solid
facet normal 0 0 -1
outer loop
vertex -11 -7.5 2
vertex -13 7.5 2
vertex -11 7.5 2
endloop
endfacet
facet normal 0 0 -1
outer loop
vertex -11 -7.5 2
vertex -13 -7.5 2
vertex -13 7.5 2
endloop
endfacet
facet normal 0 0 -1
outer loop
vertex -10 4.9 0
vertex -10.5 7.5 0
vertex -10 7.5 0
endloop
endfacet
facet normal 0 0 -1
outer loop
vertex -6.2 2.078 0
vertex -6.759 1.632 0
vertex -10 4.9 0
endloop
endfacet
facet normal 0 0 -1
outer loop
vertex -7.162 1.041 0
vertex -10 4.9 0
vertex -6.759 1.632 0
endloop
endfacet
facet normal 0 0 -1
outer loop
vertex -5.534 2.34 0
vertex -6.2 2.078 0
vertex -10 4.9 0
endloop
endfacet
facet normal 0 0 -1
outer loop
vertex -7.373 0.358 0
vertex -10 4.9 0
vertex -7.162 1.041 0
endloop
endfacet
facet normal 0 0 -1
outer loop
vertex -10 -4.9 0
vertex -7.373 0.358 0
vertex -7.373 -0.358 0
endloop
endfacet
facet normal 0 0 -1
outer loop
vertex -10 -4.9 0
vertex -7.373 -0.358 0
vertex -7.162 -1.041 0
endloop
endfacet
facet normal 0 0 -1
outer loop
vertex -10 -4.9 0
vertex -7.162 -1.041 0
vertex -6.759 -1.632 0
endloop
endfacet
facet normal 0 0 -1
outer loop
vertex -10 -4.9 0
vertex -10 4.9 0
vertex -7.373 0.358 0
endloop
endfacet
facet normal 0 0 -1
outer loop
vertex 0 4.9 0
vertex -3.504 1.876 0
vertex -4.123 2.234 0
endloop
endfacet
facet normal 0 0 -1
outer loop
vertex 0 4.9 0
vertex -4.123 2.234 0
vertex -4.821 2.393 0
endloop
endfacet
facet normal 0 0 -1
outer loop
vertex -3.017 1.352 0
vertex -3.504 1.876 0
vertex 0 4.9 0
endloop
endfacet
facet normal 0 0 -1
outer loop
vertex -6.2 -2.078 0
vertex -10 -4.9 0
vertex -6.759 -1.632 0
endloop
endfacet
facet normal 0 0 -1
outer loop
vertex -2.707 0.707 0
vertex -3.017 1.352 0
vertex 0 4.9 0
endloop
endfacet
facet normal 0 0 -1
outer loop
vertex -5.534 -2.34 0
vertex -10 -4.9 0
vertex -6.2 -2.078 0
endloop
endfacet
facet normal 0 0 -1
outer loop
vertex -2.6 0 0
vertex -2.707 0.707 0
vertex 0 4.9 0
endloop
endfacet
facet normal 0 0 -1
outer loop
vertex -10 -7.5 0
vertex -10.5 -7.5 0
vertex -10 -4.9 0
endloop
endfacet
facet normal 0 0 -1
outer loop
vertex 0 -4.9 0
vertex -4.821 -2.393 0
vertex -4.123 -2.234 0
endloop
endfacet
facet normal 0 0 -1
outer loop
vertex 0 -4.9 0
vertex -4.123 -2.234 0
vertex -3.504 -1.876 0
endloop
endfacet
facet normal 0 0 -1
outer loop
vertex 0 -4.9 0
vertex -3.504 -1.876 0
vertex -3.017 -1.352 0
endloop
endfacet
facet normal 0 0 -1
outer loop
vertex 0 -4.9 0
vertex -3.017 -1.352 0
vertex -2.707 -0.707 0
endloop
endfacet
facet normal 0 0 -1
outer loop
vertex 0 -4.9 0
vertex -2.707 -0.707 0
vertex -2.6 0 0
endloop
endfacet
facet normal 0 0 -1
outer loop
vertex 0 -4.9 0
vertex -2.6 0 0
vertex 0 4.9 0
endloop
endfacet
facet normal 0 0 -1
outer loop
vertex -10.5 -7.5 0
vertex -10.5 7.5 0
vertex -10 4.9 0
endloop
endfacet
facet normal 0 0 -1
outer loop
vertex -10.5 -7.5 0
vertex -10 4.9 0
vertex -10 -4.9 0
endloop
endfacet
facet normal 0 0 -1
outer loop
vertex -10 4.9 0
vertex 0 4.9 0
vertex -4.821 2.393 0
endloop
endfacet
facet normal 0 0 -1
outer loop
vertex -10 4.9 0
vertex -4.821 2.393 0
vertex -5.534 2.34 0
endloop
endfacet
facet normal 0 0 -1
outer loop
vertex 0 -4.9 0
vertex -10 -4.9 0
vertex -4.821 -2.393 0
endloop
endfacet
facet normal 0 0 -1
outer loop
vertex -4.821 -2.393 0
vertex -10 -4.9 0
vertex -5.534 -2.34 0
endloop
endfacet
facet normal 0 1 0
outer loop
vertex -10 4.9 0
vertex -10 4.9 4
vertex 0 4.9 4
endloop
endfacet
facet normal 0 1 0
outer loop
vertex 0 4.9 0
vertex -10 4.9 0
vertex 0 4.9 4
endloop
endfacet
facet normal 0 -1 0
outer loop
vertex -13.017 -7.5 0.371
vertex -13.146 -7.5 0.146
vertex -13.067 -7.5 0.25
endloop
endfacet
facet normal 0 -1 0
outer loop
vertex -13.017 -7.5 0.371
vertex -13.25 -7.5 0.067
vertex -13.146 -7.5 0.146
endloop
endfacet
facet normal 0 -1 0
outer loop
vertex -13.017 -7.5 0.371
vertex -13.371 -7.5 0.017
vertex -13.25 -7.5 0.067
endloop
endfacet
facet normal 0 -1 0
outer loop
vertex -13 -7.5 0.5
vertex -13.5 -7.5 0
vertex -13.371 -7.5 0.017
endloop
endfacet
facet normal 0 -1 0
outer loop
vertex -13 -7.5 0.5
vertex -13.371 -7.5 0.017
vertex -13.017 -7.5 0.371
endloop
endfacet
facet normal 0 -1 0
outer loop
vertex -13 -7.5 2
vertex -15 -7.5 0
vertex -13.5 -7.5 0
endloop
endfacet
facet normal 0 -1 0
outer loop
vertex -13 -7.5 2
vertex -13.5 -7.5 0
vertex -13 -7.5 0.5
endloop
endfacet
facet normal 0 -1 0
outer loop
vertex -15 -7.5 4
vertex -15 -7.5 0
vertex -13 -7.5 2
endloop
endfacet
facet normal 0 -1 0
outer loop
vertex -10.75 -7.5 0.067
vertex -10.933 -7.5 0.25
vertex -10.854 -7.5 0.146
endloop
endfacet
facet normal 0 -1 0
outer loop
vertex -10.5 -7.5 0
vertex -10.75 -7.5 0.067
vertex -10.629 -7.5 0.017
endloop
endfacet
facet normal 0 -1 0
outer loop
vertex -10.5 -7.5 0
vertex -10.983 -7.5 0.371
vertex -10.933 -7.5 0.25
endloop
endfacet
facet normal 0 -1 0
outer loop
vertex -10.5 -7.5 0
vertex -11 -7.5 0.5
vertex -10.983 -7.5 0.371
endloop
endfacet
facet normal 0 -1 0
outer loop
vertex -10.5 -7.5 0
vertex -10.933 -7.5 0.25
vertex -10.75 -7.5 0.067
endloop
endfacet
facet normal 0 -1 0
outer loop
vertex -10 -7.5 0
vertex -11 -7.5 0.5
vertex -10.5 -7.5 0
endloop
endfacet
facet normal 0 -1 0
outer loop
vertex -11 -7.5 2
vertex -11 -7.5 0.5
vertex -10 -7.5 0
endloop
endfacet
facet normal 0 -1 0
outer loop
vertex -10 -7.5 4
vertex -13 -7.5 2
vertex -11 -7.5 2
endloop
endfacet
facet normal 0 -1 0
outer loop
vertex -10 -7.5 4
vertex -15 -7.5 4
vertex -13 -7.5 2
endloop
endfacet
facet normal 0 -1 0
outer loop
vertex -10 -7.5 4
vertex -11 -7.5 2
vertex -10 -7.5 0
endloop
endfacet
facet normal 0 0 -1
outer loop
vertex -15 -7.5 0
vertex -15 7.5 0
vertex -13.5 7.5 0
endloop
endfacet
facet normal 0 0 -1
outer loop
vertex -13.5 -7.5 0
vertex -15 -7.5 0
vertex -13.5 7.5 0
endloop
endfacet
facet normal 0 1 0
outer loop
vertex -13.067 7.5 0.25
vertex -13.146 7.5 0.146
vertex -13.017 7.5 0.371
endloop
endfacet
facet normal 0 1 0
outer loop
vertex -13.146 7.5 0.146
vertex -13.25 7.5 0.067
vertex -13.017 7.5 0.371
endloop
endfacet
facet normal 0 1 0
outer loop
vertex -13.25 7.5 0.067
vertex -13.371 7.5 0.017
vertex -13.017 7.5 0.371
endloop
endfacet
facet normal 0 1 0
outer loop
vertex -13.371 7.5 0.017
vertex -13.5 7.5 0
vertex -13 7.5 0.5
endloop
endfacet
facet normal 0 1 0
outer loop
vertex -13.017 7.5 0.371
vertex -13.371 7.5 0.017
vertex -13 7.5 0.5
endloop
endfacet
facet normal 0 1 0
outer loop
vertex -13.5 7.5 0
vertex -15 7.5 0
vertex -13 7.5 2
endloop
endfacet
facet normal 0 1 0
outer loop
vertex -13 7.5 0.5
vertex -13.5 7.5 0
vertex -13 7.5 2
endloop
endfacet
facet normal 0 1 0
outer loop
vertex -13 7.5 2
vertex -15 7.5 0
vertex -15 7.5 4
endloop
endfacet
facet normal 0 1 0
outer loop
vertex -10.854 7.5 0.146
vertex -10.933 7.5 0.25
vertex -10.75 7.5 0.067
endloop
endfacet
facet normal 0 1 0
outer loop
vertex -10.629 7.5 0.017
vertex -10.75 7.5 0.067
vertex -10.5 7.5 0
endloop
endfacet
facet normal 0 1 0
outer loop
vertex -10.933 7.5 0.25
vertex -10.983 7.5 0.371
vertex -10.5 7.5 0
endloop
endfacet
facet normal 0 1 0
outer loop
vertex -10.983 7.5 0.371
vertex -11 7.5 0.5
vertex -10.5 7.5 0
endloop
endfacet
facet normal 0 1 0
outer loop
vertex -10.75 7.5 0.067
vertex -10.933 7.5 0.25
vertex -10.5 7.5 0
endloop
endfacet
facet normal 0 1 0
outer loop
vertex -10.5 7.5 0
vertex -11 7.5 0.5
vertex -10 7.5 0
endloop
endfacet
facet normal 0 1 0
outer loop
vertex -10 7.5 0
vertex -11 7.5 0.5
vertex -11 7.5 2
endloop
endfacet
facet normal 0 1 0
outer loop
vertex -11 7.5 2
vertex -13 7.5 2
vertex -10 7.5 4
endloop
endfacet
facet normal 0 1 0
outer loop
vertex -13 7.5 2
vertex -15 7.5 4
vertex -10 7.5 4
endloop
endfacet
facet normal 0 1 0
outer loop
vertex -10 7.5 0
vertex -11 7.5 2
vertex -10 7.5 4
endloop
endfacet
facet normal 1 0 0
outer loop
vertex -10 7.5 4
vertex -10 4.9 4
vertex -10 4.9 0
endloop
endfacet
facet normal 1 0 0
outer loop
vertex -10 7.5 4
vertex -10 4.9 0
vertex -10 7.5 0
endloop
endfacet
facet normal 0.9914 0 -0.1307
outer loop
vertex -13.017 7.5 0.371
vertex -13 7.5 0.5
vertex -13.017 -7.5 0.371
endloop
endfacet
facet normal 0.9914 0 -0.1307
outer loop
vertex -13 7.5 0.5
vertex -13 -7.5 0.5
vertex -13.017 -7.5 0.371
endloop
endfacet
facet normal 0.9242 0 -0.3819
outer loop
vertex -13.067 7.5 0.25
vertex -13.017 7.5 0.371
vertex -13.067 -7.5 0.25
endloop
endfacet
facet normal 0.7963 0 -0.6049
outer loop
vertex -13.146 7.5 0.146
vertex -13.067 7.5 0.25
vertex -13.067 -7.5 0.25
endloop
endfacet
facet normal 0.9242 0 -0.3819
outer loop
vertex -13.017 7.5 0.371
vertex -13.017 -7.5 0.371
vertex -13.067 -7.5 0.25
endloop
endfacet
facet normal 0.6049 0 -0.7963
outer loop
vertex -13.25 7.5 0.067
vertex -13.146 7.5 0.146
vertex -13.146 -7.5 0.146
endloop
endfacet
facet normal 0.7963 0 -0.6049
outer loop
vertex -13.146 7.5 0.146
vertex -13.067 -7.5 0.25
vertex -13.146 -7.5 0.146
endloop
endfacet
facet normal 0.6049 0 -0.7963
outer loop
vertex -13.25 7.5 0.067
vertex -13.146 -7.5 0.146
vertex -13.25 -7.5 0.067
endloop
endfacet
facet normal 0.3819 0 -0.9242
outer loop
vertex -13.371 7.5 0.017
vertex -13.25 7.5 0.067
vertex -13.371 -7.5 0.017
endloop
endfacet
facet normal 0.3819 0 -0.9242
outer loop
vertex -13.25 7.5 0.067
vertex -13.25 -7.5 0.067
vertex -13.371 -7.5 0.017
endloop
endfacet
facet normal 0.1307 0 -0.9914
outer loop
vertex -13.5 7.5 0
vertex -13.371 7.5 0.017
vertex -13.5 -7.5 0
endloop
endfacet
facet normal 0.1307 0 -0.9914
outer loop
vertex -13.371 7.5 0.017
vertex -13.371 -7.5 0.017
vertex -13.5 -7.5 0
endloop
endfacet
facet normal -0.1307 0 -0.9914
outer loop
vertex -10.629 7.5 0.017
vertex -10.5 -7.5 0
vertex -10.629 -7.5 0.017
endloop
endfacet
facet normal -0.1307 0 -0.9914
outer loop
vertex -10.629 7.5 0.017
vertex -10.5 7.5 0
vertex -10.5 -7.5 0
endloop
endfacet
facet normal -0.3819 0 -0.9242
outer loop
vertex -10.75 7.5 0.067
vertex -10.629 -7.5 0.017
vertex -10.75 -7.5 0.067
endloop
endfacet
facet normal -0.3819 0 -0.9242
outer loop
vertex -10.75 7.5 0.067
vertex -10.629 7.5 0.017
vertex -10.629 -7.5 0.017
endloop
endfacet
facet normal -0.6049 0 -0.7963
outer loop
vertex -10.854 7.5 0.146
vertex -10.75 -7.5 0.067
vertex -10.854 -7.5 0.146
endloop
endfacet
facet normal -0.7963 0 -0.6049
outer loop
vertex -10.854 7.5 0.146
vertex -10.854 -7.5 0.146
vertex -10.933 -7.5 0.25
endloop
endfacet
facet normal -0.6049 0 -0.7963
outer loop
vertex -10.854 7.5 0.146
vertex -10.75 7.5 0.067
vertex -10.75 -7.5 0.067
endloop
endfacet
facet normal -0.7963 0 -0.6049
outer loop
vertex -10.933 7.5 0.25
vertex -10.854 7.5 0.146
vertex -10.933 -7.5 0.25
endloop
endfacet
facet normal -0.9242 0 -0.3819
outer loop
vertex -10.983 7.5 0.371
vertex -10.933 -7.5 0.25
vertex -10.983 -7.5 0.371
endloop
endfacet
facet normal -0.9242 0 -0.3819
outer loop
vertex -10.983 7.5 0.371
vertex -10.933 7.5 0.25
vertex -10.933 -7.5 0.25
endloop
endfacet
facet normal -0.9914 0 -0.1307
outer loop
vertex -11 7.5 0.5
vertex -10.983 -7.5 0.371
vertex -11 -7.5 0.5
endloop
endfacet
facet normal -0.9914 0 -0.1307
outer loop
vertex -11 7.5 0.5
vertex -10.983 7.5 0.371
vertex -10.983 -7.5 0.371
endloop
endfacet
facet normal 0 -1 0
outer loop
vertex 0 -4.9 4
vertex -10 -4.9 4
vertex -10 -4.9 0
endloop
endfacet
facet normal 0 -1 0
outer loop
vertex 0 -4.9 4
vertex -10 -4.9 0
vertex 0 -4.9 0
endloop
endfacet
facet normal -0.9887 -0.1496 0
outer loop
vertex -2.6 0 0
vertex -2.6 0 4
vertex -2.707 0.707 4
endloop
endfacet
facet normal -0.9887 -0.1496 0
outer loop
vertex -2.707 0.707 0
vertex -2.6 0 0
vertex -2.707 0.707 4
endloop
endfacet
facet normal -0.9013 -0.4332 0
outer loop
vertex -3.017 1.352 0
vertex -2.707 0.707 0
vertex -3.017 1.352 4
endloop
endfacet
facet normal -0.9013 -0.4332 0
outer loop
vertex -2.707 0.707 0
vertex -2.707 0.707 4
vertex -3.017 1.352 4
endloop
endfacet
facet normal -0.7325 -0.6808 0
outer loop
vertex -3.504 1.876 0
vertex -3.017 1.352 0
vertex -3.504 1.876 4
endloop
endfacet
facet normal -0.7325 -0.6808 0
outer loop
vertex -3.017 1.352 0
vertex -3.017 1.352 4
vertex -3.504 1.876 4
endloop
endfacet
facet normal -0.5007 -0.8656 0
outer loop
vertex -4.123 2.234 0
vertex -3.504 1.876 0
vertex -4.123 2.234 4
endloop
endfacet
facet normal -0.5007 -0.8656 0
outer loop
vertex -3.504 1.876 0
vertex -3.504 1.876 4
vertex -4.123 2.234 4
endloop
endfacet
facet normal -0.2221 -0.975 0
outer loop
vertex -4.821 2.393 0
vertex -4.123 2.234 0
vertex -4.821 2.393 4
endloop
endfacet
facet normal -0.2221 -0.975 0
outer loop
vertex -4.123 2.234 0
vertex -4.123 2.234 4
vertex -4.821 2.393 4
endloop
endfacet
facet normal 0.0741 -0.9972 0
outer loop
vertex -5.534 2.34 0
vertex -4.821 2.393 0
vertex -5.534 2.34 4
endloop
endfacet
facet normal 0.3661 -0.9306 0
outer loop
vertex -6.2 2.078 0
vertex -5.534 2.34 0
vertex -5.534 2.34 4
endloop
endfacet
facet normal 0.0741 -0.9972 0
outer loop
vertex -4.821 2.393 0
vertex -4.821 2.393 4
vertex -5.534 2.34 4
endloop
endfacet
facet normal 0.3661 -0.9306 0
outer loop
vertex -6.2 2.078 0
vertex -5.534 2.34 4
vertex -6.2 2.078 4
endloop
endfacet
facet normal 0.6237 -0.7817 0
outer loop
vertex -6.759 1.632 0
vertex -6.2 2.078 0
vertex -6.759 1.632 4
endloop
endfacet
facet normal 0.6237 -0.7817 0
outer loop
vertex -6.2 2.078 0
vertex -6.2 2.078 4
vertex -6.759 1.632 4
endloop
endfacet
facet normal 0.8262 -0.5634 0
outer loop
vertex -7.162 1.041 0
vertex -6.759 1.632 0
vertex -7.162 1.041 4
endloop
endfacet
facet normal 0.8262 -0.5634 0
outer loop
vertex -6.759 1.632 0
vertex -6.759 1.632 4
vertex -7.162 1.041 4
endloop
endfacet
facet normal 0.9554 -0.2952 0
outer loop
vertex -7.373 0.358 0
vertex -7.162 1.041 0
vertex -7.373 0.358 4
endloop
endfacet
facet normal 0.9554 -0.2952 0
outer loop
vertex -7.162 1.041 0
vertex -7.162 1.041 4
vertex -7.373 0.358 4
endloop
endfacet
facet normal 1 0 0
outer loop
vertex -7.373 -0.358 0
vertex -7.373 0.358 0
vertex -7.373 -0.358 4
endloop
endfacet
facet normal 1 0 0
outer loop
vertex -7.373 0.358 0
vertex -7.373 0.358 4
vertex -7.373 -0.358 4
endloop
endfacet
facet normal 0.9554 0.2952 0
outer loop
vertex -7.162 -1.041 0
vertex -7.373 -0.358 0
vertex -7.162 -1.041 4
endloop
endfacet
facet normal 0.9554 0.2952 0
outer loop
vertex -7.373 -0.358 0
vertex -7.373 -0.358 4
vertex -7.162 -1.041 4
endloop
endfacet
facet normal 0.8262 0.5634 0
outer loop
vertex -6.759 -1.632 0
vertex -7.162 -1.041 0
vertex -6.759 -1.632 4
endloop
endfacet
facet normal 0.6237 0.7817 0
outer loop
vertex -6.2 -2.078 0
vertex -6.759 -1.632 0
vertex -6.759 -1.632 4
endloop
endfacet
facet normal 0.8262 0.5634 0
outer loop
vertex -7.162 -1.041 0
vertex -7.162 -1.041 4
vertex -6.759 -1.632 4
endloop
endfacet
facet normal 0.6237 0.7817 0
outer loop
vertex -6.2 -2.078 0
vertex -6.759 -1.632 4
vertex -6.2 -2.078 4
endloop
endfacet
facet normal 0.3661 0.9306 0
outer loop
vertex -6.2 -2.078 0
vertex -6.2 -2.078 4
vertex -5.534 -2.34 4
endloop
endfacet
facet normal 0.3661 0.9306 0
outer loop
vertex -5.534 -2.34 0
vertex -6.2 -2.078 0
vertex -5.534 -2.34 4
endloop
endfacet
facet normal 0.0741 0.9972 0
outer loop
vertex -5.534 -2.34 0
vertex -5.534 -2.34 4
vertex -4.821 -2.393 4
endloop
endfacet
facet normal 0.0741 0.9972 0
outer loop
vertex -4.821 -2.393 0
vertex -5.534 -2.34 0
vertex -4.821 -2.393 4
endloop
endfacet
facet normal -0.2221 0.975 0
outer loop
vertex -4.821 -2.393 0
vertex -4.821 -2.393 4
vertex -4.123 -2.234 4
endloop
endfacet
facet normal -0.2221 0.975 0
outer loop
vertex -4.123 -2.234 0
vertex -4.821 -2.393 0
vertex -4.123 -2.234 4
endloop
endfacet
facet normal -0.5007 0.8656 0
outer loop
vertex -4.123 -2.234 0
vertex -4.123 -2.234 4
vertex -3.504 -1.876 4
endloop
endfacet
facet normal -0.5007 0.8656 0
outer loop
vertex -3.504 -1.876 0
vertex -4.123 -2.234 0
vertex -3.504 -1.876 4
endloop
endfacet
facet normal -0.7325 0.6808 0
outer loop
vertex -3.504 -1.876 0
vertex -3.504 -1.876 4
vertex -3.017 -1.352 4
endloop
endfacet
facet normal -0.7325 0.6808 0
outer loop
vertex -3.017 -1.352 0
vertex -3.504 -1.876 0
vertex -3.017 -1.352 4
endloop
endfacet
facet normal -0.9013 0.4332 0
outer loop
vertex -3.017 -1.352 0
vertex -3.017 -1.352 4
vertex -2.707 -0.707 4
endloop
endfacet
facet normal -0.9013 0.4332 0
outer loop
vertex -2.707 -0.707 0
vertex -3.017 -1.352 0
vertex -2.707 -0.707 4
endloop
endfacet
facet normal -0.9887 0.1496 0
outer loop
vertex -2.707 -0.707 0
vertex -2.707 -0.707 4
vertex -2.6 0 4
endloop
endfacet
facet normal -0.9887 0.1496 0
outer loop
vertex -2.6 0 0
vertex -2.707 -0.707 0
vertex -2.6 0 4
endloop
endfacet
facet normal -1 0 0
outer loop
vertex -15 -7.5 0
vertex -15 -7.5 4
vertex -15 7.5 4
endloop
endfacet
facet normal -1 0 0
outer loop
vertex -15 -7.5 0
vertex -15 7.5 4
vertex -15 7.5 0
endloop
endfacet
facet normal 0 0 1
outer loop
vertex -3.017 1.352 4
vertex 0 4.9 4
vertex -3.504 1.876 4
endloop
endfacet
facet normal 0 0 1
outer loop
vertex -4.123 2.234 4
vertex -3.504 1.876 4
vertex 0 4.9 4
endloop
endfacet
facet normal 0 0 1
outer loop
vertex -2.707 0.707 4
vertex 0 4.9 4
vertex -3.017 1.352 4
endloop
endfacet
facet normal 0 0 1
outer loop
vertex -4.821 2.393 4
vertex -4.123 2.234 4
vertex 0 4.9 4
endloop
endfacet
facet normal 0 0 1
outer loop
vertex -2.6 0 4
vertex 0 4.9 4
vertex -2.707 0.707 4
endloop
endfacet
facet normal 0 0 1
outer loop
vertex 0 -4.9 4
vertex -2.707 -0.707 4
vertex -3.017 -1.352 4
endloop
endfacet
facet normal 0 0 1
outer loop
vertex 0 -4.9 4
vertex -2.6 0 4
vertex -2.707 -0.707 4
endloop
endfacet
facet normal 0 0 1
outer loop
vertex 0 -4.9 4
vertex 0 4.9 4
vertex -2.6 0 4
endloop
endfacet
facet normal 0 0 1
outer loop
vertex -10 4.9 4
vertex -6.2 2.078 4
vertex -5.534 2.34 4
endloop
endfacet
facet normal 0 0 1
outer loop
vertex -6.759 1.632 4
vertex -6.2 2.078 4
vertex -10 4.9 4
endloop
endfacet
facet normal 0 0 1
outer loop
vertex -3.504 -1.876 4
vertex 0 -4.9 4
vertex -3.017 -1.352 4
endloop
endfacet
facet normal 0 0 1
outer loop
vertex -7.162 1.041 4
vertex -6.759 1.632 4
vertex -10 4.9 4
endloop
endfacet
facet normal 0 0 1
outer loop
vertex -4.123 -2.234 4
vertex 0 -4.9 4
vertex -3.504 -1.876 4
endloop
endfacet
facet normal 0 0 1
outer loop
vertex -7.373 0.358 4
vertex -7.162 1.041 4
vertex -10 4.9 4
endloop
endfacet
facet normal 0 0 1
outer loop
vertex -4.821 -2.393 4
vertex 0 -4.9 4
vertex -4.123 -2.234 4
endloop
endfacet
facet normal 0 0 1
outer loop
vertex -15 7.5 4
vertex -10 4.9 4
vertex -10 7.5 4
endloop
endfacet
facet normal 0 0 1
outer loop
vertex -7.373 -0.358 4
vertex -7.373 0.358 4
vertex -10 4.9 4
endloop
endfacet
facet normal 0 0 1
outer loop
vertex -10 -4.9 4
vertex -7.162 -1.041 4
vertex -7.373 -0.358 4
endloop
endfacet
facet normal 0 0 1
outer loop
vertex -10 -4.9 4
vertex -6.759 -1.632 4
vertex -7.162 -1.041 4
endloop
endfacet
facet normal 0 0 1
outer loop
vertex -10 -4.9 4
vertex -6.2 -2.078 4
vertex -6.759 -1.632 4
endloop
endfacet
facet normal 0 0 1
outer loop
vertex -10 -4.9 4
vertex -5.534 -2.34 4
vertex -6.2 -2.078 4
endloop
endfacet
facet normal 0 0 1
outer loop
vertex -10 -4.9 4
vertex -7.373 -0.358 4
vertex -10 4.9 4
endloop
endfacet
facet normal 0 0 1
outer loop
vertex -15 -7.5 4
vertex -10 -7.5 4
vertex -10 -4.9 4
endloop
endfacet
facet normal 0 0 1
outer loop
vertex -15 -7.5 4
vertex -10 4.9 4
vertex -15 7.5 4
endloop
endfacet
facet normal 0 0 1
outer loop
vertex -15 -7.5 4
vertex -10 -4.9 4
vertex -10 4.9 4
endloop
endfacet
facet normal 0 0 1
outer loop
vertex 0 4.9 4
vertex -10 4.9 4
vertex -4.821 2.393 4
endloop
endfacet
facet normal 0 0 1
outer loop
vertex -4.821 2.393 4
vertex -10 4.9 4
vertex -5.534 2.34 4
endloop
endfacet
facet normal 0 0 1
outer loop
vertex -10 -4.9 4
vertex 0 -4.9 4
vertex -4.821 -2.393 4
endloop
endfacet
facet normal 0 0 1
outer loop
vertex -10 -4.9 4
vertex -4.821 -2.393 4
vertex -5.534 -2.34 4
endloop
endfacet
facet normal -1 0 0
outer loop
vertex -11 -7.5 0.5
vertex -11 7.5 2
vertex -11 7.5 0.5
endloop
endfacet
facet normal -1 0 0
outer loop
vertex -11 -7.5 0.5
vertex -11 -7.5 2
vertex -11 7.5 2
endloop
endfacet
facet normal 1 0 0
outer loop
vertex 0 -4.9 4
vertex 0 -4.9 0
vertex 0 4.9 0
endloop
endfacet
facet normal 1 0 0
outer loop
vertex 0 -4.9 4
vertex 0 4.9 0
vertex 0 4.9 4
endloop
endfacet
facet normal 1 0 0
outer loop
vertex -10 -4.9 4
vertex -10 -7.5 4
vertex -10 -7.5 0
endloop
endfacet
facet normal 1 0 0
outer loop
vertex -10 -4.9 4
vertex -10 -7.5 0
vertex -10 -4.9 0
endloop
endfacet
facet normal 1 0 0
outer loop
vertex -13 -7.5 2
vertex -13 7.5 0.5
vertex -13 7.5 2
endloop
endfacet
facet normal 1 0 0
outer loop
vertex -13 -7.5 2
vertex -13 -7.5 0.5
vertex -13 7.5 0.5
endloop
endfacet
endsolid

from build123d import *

# Parameters (mm, degrees)
F1_DEPTH      = 7.5
F1_DEPTH_BACK = 7.5
F2_R          = 2.4
F3_DEPTH      = 4.001
F4_W          = 10
F4_H          = 2.6
F5_DEPTH      = 4.001
F6_R          = 0.5


with BuildPart() as f1:
    # F0 (on Front) → F1 (new body, two sides)
    with BuildSketch(Plane.XZ) as f1_sk:
        Polygon((-11, 0), (0, 0), (0, 4), (-15, 4), (-15, 0), (-13, 0), (-13, 2), (-11, 2), align=None)
    extrude(amount=F1_DEPTH)
    extrude(f1_sk.sketch, amount=-F1_DEPTH_BACK)

    # F2 (on face) → F3 (cut, through all)
    with BuildSketch(Plane.XY.offset(4)):
        with Locations((-5, 0)):
            Circle(F2_R)
    extrude(amount=-F3_DEPTH, mode=Mode.SUBTRACT)

    # F4 (on face) → F5 (cut, through all)
    with BuildSketch(Plane.XY.offset(4)):
        with Locations((-5, 6.2)):
            Rectangle(F4_W, F4_H)
        with Locations((-5, -6.2)):
            Rectangle(F4_W, F4_H)
    extrude(amount=-F5_DEPTH, mode=Mode.SUBTRACT)

    # F6
    f6_edges = [f1.edges().sort_by_distance(p)[0] for p in [
        (-13, 0, 0),
        (-11, 0, 0),
    ]]
    fillet(f6_edges, radius=F6_R)


solid = f1.part
